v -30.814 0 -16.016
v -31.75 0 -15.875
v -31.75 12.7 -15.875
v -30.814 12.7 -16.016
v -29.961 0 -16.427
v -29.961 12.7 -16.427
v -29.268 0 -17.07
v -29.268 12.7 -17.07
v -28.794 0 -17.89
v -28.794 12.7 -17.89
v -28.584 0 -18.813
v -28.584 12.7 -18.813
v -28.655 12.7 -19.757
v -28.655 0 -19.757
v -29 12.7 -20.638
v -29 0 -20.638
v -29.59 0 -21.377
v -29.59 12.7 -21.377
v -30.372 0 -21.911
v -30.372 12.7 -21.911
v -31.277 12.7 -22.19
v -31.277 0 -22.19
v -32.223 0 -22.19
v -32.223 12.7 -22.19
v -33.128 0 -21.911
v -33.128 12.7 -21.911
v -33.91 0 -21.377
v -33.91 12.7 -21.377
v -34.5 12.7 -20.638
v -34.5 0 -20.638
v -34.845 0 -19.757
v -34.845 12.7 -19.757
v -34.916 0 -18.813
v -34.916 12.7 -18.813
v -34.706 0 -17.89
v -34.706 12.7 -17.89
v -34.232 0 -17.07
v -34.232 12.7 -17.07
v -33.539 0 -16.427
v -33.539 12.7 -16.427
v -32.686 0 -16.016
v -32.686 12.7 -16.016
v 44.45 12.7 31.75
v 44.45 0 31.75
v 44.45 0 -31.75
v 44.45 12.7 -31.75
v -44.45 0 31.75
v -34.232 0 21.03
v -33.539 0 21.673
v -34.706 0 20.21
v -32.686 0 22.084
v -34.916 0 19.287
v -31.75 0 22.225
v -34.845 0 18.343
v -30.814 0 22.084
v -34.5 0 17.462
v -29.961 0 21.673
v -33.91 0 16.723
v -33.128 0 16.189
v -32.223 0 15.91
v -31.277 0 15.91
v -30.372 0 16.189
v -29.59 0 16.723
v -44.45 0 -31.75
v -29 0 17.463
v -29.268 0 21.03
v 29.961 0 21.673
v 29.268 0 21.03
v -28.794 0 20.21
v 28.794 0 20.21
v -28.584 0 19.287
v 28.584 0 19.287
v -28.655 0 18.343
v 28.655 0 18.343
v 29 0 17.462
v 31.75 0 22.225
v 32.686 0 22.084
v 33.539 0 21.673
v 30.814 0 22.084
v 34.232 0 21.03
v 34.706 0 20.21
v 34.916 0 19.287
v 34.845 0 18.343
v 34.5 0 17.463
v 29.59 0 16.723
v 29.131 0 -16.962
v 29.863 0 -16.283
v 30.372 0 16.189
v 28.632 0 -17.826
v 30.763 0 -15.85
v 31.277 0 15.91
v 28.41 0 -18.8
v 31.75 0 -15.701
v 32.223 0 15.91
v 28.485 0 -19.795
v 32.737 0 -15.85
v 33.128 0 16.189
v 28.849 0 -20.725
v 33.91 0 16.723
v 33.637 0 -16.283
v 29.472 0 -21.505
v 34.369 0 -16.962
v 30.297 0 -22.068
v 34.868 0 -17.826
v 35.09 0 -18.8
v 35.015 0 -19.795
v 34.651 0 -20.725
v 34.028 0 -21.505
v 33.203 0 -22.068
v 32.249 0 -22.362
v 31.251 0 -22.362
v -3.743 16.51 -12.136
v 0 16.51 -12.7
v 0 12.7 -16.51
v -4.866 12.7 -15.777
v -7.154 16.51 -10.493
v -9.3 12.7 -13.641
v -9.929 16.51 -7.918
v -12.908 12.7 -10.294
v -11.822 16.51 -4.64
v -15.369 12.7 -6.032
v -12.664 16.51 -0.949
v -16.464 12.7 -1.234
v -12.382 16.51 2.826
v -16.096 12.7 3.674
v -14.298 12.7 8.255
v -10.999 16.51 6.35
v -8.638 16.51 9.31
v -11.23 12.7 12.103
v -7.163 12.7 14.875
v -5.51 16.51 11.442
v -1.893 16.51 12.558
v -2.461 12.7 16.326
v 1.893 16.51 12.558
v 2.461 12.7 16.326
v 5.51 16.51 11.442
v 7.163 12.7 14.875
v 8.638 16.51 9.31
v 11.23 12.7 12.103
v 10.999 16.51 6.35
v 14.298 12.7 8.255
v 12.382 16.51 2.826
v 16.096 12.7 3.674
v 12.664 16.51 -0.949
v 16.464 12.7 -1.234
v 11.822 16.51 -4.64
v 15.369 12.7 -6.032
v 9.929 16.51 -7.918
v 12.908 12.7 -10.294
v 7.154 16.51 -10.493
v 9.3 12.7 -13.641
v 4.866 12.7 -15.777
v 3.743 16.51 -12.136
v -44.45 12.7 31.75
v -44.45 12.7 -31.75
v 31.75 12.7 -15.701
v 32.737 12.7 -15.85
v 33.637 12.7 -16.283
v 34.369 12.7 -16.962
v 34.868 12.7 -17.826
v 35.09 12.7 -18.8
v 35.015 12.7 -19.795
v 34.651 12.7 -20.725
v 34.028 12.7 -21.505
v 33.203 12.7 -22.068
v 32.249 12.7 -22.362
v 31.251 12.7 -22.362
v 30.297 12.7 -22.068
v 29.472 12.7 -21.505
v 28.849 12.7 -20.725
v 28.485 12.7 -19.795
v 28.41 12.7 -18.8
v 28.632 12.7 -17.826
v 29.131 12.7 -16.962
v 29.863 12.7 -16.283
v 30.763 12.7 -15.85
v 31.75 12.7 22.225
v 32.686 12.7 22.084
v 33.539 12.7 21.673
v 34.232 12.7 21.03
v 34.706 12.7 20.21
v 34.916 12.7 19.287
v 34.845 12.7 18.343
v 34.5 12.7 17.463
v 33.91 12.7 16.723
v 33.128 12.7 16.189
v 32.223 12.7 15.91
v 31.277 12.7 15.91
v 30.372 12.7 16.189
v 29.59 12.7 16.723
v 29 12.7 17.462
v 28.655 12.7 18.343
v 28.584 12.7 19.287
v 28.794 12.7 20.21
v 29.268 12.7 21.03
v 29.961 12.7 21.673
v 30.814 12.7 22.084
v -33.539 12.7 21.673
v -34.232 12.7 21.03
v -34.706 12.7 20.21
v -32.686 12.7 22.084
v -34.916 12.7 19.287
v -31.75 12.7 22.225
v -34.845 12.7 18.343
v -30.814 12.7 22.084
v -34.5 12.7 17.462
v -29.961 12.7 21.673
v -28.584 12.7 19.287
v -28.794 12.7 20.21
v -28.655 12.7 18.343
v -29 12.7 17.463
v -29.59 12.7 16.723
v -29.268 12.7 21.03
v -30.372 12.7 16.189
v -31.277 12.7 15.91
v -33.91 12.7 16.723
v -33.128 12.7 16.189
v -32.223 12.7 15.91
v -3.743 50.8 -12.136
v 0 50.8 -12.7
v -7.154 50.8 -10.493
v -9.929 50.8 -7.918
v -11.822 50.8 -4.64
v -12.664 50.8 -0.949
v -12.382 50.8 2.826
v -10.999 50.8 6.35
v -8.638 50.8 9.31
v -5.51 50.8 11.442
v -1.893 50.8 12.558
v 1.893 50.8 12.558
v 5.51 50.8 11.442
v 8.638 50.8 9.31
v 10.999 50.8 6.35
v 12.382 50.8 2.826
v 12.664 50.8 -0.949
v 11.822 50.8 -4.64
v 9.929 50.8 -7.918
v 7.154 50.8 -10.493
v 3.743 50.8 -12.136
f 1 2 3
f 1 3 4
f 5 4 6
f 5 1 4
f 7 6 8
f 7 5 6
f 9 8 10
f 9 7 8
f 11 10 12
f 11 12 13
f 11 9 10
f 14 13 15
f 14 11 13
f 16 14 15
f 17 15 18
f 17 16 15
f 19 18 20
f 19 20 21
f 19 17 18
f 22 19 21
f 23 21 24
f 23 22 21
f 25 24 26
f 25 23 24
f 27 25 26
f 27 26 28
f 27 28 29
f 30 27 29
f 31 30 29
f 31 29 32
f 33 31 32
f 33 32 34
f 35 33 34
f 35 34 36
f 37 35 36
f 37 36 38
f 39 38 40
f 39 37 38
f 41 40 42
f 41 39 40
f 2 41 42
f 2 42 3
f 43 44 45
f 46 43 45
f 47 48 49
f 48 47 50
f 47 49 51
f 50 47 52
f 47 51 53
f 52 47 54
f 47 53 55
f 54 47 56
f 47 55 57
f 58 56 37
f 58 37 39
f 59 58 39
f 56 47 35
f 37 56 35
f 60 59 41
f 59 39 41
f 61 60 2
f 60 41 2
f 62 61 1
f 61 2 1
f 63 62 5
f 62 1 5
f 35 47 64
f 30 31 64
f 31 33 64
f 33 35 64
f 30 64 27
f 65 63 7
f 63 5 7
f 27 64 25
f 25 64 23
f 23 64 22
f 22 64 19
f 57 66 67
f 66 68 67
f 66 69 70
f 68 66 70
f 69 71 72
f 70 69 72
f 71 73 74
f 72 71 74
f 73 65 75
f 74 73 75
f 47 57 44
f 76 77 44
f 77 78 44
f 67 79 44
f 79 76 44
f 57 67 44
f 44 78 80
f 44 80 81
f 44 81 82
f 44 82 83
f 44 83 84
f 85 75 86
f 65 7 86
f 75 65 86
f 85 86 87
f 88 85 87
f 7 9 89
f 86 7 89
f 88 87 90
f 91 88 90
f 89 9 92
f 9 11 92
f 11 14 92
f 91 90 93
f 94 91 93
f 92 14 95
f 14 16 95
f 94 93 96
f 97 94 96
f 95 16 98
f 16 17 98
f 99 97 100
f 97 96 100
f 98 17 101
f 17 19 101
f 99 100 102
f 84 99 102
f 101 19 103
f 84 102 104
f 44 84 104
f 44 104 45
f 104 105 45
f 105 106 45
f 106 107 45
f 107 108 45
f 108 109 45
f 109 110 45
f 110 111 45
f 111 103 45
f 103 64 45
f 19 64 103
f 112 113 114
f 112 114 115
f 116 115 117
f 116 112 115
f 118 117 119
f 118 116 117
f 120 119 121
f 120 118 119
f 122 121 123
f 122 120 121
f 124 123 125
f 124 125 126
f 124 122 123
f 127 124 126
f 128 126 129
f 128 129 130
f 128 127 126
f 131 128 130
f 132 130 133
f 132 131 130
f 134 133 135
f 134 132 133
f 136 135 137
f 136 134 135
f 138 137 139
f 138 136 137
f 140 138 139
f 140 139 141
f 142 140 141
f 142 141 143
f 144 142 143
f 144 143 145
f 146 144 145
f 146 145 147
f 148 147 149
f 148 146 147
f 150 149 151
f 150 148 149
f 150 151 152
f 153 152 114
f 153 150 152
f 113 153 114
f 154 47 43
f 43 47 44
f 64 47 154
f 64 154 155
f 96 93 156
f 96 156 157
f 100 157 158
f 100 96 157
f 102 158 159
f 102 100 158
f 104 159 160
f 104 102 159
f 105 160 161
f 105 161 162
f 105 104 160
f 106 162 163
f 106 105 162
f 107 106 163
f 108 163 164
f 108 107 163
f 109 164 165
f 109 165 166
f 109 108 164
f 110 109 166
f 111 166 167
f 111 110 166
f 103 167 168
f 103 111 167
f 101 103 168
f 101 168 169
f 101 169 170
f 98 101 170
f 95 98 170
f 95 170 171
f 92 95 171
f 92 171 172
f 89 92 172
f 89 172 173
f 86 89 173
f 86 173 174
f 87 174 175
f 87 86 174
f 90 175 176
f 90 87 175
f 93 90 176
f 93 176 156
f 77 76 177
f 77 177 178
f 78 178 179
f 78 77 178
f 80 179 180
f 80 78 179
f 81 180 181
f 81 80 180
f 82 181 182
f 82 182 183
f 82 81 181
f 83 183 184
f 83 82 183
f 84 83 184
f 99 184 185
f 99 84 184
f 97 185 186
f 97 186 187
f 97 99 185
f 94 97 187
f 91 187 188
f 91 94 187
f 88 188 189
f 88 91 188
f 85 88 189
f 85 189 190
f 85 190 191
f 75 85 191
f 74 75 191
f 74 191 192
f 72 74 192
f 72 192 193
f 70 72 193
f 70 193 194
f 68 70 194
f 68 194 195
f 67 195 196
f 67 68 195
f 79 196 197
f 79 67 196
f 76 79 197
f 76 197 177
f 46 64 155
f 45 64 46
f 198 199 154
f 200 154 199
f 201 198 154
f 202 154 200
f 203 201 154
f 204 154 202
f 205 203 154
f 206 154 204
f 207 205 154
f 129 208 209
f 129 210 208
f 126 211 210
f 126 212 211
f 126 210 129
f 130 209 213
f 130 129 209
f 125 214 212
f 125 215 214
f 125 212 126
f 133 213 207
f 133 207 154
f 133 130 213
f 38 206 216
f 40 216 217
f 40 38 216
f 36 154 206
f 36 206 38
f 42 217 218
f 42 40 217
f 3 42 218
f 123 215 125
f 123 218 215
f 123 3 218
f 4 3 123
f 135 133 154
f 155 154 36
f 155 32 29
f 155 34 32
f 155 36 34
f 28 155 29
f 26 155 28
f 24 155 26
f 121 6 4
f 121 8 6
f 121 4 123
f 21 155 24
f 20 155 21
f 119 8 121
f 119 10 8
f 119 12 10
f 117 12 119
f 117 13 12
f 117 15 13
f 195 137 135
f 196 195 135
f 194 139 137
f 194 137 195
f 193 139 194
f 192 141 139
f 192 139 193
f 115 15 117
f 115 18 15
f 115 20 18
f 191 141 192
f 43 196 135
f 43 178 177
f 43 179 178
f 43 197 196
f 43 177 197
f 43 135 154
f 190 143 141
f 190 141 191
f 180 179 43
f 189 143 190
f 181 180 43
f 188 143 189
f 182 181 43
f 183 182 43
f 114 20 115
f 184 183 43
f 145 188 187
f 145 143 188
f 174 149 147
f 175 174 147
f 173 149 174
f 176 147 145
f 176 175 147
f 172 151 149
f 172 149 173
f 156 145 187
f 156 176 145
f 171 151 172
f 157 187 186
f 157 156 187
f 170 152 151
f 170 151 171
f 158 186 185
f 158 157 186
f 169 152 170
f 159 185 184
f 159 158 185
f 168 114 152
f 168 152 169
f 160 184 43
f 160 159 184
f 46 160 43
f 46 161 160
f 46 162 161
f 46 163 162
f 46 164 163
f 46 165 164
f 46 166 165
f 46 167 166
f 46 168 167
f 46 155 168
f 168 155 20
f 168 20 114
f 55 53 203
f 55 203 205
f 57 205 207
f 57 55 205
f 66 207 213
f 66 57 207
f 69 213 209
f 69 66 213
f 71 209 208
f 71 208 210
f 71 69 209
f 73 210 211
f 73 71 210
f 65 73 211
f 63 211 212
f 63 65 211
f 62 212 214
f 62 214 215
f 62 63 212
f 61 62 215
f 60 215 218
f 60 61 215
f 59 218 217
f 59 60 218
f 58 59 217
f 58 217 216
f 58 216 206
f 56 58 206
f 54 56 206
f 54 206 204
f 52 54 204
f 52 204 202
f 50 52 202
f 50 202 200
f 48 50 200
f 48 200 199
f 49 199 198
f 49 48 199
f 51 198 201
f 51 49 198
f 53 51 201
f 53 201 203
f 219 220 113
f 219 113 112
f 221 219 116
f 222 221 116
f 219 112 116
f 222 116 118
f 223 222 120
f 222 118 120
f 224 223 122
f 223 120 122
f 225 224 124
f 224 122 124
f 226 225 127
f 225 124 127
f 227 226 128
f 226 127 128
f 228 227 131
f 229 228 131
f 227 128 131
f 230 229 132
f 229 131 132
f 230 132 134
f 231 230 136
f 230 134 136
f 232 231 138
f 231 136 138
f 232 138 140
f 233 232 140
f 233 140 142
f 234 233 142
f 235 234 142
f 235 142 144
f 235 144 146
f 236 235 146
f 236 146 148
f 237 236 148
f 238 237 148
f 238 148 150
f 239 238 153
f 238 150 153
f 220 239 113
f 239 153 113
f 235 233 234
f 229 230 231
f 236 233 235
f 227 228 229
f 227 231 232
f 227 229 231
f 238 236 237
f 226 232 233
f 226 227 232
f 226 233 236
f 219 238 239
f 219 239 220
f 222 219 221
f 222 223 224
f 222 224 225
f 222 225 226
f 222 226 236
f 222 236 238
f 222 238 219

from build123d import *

# Parameters (mm, degrees)
SKETCH1_W           = 88.9
SKETCH1_H           = 63.5
SKETCH1_R           = 3.175
SKETCH1_R_2         = 3.349234597
BOSS_EXTRUDE1_DEPTH = 12.7
SKETCH2_R           = 12.7
BOSS_EXTRUDE2_DEPTH = 38.1
CHAMFER1_SIZE       = 3.81


with BuildPart() as part:
    # Sketch1 → Boss-Extrude1 (new body)
    with BuildSketch(Plane(origin=(0, 0, 0), x_dir=(1, 0, 0), z_dir=(0, 1, 0))):
        Rectangle(SKETCH1_W, SKETCH1_H)
        with Locations(Location((-31.75, 19.05, 0), (0, 0, 270))):
            Circle(SKETCH1_R, mode=Mode.SUBTRACT)
        with Locations(Location((-31.75, -19.05, 0), (0, 0, 270))):
            Circle(SKETCH1_R, mode=Mode.SUBTRACT)
        with Locations(Location((31.75, -19.05, 0), (0, 0, 270))):
            Circle(SKETCH1_R, mode=Mode.SUBTRACT)
        with Locations(Location((31.75, 19.05, 0), (0, 0, 270))):
            Circle(SKETCH1_R_2, mode=Mode.SUBTRACT)
    extrude(amount=BOSS_EXTRUDE1_DEPTH)

    # Sketch2 → Boss-Extrude2 (add)
    with BuildSketch(Plane(origin=(0, 12.7, 0), x_dir=(1, 0, 0), z_dir=(0, 1, 0))):
        with Locations(Location((0, 0, 0), (0, 0, 90))):
            Circle(SKETCH2_R)
    extrude(amount=BOSS_EXTRUDE2_DEPTH)

    # Chamfer1
    chamfer1_edges = [part.edges().sort_by_distance(p)[0] for p in [
        (0, 12.7, 12.7),
    ]]
    chamfer(chamfer1_edges, length=CHAMFER1_SIZE)


solid = part.part
